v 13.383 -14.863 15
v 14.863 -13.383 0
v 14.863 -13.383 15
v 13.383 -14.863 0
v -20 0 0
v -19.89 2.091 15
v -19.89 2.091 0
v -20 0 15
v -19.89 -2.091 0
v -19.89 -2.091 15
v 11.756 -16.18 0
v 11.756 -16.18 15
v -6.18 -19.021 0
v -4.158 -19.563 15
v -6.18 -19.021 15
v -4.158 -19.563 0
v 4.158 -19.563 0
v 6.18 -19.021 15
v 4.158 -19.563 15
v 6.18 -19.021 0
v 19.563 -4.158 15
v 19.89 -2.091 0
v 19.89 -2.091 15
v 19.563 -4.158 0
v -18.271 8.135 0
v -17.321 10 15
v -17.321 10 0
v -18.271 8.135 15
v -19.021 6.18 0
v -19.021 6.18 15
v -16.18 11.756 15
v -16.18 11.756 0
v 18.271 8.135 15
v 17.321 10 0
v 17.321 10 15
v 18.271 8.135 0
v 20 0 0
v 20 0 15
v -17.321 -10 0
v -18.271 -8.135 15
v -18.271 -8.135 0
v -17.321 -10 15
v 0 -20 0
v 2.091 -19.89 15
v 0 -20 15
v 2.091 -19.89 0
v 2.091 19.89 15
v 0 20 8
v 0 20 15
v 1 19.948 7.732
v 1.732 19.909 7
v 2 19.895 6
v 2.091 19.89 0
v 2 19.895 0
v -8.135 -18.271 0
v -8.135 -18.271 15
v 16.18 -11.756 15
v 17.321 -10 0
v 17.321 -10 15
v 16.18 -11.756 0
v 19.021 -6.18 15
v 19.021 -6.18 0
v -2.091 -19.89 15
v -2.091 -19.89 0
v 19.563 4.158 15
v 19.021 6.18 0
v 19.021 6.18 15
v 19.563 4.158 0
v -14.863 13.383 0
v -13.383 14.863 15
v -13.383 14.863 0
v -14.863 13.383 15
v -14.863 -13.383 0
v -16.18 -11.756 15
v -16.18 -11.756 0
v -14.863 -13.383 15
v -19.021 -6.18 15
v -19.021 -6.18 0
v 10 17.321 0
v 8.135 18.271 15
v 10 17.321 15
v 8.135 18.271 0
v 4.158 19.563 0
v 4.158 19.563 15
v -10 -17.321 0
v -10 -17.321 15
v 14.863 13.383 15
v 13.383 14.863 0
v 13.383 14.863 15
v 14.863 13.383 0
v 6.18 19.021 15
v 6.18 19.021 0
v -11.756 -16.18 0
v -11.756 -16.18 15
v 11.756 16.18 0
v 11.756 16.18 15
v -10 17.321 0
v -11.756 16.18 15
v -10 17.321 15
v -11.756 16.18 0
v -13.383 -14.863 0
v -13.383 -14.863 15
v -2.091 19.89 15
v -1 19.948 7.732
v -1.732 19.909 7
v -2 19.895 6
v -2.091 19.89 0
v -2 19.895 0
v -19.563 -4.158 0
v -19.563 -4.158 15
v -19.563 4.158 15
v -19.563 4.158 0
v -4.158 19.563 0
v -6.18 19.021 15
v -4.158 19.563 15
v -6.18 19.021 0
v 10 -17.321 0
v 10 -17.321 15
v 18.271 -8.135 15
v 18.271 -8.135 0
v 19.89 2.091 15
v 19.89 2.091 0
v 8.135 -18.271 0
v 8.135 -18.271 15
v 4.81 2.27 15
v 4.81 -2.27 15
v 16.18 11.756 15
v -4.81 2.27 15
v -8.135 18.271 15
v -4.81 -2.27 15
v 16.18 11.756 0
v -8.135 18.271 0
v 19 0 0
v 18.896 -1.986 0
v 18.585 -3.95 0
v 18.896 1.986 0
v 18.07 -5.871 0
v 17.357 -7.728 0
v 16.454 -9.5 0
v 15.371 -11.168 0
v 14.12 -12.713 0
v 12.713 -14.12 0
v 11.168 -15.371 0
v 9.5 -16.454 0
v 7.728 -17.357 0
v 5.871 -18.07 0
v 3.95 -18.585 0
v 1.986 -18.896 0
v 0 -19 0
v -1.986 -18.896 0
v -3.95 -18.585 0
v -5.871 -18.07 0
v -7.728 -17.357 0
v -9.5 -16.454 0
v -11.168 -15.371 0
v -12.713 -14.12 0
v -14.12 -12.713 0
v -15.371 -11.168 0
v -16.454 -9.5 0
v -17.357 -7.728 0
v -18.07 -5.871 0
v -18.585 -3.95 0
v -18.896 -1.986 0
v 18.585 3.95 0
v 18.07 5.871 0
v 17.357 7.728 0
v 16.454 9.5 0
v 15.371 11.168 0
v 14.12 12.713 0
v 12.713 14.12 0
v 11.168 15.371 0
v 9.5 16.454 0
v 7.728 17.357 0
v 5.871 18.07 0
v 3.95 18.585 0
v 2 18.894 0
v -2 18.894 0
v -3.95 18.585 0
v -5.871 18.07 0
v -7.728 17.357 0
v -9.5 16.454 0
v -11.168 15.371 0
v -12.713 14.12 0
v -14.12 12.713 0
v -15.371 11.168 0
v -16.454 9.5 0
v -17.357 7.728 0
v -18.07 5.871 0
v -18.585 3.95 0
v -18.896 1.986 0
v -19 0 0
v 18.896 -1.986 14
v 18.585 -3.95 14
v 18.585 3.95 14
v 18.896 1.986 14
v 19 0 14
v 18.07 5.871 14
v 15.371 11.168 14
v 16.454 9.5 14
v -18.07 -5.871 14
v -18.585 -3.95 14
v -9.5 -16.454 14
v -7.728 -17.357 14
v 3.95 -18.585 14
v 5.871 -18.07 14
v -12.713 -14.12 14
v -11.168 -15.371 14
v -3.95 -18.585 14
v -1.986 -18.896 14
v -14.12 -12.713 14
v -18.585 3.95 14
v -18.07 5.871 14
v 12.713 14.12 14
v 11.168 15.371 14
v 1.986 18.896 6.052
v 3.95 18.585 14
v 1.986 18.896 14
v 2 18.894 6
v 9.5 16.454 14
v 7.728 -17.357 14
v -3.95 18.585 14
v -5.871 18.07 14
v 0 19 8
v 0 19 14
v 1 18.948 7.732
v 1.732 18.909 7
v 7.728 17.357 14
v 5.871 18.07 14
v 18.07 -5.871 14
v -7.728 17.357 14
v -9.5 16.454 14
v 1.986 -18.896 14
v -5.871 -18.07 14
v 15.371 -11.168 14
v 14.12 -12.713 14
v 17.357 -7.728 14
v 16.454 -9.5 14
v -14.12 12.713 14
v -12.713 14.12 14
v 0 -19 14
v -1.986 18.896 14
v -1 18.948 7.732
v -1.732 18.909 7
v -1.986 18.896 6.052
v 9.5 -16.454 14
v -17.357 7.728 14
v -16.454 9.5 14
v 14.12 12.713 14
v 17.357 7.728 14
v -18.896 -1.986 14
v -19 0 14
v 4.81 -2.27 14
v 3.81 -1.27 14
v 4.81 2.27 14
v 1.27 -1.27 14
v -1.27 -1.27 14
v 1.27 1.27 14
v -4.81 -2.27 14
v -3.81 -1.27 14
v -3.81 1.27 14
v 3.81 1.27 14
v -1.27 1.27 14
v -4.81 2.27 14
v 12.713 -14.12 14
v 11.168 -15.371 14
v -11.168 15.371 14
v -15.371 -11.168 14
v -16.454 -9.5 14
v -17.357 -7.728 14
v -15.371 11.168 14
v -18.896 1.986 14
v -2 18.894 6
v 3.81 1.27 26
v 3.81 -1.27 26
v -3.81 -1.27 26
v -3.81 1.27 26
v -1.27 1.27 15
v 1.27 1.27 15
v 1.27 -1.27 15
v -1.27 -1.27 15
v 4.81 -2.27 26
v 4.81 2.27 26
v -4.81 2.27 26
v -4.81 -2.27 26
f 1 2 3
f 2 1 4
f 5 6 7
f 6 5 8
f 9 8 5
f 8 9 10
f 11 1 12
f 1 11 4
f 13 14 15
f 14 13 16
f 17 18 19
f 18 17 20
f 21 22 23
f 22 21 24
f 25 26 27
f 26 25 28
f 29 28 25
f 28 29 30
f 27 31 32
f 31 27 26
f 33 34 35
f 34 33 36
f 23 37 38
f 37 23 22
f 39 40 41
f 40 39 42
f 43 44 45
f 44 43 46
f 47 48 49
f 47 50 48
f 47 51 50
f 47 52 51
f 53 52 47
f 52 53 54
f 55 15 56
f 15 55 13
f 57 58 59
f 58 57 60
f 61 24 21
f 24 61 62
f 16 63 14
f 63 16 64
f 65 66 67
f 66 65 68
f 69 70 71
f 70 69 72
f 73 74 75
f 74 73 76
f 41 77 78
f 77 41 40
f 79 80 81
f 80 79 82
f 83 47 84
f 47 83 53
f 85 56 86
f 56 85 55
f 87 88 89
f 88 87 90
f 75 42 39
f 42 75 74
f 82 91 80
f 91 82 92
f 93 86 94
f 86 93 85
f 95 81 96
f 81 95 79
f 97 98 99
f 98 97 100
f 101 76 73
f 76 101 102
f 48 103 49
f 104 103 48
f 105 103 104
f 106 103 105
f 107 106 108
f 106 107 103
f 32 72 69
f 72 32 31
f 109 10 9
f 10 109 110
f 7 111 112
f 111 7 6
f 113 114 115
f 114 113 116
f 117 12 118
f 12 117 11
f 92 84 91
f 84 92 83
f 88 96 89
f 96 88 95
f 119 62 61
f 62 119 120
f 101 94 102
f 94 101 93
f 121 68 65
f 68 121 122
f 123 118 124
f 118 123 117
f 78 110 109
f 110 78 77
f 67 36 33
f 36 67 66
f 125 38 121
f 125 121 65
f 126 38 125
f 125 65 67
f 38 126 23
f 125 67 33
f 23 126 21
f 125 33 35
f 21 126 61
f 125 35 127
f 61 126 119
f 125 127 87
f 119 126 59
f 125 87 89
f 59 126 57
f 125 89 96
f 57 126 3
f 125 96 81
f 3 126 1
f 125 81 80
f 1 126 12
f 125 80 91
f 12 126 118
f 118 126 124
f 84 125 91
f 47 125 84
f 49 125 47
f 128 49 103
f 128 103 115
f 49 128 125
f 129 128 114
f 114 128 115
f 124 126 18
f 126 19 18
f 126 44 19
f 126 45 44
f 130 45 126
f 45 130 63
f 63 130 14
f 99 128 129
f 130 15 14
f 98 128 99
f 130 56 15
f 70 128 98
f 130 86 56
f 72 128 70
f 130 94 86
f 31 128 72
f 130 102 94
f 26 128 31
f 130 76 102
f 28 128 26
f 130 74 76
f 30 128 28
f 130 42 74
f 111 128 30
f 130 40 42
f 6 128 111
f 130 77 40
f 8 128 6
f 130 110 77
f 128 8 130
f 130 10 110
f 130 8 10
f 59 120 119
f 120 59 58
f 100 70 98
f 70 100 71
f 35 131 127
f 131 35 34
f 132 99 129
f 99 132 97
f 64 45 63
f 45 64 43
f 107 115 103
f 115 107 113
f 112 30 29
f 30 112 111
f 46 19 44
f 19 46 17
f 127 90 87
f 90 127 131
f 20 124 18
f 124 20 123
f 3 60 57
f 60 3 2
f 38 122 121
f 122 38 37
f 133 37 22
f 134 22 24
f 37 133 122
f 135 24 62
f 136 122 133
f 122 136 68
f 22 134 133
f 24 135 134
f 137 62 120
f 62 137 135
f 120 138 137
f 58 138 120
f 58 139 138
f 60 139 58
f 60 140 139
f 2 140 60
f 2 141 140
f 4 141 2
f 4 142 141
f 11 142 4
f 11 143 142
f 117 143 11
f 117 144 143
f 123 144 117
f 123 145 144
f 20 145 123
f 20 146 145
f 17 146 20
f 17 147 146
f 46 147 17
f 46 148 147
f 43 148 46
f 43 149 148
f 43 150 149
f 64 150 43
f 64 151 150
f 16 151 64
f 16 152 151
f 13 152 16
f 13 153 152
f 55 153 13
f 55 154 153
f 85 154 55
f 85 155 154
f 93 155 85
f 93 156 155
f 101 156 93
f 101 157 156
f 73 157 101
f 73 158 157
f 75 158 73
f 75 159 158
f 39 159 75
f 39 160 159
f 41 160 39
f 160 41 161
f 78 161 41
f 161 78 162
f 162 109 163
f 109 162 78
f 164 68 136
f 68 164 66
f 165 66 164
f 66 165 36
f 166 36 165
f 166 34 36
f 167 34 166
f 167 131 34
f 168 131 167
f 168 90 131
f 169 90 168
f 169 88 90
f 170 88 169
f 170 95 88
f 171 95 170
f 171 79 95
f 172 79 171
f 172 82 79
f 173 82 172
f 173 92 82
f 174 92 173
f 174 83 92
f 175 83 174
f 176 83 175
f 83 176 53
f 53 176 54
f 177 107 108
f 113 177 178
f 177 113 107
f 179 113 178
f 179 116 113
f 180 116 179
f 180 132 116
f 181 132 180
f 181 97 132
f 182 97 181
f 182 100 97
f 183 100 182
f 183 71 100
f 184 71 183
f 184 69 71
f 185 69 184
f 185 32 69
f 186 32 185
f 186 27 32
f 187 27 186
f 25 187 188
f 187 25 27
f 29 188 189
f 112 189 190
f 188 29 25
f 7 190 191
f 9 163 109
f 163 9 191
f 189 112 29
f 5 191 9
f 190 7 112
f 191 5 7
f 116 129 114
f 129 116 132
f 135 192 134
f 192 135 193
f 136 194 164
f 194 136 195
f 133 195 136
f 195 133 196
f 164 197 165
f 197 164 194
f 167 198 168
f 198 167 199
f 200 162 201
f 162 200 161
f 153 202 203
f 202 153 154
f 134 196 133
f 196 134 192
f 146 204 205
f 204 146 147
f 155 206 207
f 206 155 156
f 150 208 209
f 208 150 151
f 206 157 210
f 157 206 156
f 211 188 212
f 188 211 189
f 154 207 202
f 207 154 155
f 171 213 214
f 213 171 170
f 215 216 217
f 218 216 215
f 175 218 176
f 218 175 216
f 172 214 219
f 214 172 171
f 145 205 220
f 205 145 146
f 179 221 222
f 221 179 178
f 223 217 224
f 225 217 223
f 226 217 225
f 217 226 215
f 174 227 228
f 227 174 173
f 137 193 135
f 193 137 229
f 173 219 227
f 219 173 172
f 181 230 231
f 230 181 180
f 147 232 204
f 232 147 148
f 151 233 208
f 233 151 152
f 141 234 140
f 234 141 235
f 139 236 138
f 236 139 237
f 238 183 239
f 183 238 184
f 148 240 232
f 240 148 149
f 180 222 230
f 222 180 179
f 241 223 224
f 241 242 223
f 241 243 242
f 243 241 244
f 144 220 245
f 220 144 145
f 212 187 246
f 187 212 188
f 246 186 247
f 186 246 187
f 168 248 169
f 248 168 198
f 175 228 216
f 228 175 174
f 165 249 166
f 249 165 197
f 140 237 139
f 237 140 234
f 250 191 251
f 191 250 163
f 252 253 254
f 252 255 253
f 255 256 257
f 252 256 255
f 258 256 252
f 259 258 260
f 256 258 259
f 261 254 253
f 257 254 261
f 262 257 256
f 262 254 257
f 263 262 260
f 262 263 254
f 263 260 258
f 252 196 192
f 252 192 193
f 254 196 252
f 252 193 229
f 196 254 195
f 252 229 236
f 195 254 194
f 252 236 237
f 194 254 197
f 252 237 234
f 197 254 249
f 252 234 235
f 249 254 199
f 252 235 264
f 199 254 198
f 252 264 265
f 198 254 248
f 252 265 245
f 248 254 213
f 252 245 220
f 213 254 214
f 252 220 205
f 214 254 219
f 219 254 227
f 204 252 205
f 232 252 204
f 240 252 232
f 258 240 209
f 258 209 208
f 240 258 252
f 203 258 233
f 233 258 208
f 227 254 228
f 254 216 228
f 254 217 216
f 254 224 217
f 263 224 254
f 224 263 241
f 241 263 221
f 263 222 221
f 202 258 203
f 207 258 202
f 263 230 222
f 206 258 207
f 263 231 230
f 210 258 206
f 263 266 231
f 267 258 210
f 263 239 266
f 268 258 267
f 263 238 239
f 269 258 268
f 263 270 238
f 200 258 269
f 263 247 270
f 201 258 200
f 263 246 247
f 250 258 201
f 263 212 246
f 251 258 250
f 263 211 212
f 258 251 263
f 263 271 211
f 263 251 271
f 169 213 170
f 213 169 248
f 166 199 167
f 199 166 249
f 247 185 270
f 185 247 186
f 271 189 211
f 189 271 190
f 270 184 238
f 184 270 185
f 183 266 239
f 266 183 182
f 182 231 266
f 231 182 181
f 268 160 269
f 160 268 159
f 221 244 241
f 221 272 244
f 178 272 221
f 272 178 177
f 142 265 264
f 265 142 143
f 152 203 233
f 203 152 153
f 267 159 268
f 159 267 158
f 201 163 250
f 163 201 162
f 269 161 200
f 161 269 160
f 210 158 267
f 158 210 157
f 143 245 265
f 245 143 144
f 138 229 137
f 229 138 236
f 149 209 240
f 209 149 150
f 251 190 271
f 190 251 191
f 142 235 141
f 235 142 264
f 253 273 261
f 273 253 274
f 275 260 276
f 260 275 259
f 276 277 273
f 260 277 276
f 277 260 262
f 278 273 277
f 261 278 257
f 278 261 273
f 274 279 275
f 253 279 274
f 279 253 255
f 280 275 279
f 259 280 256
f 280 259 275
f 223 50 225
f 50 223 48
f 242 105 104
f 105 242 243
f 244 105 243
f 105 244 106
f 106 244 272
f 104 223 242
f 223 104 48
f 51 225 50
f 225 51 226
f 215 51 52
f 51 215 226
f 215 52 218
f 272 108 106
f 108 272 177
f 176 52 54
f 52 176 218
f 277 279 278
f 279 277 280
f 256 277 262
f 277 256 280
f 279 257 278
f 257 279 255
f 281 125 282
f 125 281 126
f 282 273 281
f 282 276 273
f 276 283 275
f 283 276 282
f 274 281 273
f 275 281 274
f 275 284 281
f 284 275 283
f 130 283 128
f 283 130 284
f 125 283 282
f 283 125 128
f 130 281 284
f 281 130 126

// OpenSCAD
module header( pin_size, pins ) {
	header_depth = pin_size;
	header_width = header_depth * pins;
	header_height = pin_size * 5;

	translate( [ 0 - ( header_width / 2 ), 0 - ( header_depth / 2 ), 0 ] ) {
		union() {
			cube( [ header_width, header_depth, header_height ] );
			translate( [ 0, 0, (0 - header_depth) ] ) {
				cube( [ header_depth, header_depth, header_depth ] );
			}
			translate( [ ( header_depth * 2 ), 0, ( 0 - header_depth ) ] ) {
				cube( [ header_depth, header_depth, header_depth ] );
			}
		}
	}
}

module surround( pin_size, thickness ) {
	num_pins = 3;

	header_depth = pin_size;
	header_width = header_depth * num_pins;
	header_height = pin_size * 5;

	surround_depth = header_depth + ( thickness * 2 );
	surround_width = header_width + ( thickness * 2 );
	surround_height = 12;

	difference() {
		translate( [ 0 - ( surround_width / 2 ), 0 - ( surround_depth / 2 ), 0] ) {
			cube( [ surround_width, surround_depth, surround_height ] );
		}
		translate( [ 0, 0, thickness ] ) {
			header( pin_size, num_pins );
		}
	}
}

module tealight( radius, height, thickness ) {
	difference() {
		hull() cylinder( r = radius, height, $fn = ( radius * 3 ) );
		cylinder( r = ( radius - thickness ), ( height - thickness ), $fn = ( radius * 3 ) );
	}
}

module escapehole( diameter, length ) {
	radius = diameter / 2;
	faces = diameter * 3;
	union() {
		translate( [ 0, 0, diameter * 1.5 ] ) {
			rotate(90, [0, 1, 0]) {
				cylinder( r = radius, length, $fn = faces );
			};
		}
		translate( [ 0, 0 - radius, 0 ] ) {
			cube( [ length, diameter, diameter * 1.5 ] );
		};
	};
}

module ledtealight() {
	pin_size = 2.54;
	union() {
		difference() {
			tealight( 20, 15, 1 );
			
			translate( [ 0, 0, 10 ] ) {
				header( pin_size, 3 );
			};
			
			rotate( 90 ) {
				escapehole( 4, 20 );
			}
		}
		translate( [ 0, 0, 14 ] ) {
			surround( pin_size, 1 );
		}
	}
}

ledtealight();
